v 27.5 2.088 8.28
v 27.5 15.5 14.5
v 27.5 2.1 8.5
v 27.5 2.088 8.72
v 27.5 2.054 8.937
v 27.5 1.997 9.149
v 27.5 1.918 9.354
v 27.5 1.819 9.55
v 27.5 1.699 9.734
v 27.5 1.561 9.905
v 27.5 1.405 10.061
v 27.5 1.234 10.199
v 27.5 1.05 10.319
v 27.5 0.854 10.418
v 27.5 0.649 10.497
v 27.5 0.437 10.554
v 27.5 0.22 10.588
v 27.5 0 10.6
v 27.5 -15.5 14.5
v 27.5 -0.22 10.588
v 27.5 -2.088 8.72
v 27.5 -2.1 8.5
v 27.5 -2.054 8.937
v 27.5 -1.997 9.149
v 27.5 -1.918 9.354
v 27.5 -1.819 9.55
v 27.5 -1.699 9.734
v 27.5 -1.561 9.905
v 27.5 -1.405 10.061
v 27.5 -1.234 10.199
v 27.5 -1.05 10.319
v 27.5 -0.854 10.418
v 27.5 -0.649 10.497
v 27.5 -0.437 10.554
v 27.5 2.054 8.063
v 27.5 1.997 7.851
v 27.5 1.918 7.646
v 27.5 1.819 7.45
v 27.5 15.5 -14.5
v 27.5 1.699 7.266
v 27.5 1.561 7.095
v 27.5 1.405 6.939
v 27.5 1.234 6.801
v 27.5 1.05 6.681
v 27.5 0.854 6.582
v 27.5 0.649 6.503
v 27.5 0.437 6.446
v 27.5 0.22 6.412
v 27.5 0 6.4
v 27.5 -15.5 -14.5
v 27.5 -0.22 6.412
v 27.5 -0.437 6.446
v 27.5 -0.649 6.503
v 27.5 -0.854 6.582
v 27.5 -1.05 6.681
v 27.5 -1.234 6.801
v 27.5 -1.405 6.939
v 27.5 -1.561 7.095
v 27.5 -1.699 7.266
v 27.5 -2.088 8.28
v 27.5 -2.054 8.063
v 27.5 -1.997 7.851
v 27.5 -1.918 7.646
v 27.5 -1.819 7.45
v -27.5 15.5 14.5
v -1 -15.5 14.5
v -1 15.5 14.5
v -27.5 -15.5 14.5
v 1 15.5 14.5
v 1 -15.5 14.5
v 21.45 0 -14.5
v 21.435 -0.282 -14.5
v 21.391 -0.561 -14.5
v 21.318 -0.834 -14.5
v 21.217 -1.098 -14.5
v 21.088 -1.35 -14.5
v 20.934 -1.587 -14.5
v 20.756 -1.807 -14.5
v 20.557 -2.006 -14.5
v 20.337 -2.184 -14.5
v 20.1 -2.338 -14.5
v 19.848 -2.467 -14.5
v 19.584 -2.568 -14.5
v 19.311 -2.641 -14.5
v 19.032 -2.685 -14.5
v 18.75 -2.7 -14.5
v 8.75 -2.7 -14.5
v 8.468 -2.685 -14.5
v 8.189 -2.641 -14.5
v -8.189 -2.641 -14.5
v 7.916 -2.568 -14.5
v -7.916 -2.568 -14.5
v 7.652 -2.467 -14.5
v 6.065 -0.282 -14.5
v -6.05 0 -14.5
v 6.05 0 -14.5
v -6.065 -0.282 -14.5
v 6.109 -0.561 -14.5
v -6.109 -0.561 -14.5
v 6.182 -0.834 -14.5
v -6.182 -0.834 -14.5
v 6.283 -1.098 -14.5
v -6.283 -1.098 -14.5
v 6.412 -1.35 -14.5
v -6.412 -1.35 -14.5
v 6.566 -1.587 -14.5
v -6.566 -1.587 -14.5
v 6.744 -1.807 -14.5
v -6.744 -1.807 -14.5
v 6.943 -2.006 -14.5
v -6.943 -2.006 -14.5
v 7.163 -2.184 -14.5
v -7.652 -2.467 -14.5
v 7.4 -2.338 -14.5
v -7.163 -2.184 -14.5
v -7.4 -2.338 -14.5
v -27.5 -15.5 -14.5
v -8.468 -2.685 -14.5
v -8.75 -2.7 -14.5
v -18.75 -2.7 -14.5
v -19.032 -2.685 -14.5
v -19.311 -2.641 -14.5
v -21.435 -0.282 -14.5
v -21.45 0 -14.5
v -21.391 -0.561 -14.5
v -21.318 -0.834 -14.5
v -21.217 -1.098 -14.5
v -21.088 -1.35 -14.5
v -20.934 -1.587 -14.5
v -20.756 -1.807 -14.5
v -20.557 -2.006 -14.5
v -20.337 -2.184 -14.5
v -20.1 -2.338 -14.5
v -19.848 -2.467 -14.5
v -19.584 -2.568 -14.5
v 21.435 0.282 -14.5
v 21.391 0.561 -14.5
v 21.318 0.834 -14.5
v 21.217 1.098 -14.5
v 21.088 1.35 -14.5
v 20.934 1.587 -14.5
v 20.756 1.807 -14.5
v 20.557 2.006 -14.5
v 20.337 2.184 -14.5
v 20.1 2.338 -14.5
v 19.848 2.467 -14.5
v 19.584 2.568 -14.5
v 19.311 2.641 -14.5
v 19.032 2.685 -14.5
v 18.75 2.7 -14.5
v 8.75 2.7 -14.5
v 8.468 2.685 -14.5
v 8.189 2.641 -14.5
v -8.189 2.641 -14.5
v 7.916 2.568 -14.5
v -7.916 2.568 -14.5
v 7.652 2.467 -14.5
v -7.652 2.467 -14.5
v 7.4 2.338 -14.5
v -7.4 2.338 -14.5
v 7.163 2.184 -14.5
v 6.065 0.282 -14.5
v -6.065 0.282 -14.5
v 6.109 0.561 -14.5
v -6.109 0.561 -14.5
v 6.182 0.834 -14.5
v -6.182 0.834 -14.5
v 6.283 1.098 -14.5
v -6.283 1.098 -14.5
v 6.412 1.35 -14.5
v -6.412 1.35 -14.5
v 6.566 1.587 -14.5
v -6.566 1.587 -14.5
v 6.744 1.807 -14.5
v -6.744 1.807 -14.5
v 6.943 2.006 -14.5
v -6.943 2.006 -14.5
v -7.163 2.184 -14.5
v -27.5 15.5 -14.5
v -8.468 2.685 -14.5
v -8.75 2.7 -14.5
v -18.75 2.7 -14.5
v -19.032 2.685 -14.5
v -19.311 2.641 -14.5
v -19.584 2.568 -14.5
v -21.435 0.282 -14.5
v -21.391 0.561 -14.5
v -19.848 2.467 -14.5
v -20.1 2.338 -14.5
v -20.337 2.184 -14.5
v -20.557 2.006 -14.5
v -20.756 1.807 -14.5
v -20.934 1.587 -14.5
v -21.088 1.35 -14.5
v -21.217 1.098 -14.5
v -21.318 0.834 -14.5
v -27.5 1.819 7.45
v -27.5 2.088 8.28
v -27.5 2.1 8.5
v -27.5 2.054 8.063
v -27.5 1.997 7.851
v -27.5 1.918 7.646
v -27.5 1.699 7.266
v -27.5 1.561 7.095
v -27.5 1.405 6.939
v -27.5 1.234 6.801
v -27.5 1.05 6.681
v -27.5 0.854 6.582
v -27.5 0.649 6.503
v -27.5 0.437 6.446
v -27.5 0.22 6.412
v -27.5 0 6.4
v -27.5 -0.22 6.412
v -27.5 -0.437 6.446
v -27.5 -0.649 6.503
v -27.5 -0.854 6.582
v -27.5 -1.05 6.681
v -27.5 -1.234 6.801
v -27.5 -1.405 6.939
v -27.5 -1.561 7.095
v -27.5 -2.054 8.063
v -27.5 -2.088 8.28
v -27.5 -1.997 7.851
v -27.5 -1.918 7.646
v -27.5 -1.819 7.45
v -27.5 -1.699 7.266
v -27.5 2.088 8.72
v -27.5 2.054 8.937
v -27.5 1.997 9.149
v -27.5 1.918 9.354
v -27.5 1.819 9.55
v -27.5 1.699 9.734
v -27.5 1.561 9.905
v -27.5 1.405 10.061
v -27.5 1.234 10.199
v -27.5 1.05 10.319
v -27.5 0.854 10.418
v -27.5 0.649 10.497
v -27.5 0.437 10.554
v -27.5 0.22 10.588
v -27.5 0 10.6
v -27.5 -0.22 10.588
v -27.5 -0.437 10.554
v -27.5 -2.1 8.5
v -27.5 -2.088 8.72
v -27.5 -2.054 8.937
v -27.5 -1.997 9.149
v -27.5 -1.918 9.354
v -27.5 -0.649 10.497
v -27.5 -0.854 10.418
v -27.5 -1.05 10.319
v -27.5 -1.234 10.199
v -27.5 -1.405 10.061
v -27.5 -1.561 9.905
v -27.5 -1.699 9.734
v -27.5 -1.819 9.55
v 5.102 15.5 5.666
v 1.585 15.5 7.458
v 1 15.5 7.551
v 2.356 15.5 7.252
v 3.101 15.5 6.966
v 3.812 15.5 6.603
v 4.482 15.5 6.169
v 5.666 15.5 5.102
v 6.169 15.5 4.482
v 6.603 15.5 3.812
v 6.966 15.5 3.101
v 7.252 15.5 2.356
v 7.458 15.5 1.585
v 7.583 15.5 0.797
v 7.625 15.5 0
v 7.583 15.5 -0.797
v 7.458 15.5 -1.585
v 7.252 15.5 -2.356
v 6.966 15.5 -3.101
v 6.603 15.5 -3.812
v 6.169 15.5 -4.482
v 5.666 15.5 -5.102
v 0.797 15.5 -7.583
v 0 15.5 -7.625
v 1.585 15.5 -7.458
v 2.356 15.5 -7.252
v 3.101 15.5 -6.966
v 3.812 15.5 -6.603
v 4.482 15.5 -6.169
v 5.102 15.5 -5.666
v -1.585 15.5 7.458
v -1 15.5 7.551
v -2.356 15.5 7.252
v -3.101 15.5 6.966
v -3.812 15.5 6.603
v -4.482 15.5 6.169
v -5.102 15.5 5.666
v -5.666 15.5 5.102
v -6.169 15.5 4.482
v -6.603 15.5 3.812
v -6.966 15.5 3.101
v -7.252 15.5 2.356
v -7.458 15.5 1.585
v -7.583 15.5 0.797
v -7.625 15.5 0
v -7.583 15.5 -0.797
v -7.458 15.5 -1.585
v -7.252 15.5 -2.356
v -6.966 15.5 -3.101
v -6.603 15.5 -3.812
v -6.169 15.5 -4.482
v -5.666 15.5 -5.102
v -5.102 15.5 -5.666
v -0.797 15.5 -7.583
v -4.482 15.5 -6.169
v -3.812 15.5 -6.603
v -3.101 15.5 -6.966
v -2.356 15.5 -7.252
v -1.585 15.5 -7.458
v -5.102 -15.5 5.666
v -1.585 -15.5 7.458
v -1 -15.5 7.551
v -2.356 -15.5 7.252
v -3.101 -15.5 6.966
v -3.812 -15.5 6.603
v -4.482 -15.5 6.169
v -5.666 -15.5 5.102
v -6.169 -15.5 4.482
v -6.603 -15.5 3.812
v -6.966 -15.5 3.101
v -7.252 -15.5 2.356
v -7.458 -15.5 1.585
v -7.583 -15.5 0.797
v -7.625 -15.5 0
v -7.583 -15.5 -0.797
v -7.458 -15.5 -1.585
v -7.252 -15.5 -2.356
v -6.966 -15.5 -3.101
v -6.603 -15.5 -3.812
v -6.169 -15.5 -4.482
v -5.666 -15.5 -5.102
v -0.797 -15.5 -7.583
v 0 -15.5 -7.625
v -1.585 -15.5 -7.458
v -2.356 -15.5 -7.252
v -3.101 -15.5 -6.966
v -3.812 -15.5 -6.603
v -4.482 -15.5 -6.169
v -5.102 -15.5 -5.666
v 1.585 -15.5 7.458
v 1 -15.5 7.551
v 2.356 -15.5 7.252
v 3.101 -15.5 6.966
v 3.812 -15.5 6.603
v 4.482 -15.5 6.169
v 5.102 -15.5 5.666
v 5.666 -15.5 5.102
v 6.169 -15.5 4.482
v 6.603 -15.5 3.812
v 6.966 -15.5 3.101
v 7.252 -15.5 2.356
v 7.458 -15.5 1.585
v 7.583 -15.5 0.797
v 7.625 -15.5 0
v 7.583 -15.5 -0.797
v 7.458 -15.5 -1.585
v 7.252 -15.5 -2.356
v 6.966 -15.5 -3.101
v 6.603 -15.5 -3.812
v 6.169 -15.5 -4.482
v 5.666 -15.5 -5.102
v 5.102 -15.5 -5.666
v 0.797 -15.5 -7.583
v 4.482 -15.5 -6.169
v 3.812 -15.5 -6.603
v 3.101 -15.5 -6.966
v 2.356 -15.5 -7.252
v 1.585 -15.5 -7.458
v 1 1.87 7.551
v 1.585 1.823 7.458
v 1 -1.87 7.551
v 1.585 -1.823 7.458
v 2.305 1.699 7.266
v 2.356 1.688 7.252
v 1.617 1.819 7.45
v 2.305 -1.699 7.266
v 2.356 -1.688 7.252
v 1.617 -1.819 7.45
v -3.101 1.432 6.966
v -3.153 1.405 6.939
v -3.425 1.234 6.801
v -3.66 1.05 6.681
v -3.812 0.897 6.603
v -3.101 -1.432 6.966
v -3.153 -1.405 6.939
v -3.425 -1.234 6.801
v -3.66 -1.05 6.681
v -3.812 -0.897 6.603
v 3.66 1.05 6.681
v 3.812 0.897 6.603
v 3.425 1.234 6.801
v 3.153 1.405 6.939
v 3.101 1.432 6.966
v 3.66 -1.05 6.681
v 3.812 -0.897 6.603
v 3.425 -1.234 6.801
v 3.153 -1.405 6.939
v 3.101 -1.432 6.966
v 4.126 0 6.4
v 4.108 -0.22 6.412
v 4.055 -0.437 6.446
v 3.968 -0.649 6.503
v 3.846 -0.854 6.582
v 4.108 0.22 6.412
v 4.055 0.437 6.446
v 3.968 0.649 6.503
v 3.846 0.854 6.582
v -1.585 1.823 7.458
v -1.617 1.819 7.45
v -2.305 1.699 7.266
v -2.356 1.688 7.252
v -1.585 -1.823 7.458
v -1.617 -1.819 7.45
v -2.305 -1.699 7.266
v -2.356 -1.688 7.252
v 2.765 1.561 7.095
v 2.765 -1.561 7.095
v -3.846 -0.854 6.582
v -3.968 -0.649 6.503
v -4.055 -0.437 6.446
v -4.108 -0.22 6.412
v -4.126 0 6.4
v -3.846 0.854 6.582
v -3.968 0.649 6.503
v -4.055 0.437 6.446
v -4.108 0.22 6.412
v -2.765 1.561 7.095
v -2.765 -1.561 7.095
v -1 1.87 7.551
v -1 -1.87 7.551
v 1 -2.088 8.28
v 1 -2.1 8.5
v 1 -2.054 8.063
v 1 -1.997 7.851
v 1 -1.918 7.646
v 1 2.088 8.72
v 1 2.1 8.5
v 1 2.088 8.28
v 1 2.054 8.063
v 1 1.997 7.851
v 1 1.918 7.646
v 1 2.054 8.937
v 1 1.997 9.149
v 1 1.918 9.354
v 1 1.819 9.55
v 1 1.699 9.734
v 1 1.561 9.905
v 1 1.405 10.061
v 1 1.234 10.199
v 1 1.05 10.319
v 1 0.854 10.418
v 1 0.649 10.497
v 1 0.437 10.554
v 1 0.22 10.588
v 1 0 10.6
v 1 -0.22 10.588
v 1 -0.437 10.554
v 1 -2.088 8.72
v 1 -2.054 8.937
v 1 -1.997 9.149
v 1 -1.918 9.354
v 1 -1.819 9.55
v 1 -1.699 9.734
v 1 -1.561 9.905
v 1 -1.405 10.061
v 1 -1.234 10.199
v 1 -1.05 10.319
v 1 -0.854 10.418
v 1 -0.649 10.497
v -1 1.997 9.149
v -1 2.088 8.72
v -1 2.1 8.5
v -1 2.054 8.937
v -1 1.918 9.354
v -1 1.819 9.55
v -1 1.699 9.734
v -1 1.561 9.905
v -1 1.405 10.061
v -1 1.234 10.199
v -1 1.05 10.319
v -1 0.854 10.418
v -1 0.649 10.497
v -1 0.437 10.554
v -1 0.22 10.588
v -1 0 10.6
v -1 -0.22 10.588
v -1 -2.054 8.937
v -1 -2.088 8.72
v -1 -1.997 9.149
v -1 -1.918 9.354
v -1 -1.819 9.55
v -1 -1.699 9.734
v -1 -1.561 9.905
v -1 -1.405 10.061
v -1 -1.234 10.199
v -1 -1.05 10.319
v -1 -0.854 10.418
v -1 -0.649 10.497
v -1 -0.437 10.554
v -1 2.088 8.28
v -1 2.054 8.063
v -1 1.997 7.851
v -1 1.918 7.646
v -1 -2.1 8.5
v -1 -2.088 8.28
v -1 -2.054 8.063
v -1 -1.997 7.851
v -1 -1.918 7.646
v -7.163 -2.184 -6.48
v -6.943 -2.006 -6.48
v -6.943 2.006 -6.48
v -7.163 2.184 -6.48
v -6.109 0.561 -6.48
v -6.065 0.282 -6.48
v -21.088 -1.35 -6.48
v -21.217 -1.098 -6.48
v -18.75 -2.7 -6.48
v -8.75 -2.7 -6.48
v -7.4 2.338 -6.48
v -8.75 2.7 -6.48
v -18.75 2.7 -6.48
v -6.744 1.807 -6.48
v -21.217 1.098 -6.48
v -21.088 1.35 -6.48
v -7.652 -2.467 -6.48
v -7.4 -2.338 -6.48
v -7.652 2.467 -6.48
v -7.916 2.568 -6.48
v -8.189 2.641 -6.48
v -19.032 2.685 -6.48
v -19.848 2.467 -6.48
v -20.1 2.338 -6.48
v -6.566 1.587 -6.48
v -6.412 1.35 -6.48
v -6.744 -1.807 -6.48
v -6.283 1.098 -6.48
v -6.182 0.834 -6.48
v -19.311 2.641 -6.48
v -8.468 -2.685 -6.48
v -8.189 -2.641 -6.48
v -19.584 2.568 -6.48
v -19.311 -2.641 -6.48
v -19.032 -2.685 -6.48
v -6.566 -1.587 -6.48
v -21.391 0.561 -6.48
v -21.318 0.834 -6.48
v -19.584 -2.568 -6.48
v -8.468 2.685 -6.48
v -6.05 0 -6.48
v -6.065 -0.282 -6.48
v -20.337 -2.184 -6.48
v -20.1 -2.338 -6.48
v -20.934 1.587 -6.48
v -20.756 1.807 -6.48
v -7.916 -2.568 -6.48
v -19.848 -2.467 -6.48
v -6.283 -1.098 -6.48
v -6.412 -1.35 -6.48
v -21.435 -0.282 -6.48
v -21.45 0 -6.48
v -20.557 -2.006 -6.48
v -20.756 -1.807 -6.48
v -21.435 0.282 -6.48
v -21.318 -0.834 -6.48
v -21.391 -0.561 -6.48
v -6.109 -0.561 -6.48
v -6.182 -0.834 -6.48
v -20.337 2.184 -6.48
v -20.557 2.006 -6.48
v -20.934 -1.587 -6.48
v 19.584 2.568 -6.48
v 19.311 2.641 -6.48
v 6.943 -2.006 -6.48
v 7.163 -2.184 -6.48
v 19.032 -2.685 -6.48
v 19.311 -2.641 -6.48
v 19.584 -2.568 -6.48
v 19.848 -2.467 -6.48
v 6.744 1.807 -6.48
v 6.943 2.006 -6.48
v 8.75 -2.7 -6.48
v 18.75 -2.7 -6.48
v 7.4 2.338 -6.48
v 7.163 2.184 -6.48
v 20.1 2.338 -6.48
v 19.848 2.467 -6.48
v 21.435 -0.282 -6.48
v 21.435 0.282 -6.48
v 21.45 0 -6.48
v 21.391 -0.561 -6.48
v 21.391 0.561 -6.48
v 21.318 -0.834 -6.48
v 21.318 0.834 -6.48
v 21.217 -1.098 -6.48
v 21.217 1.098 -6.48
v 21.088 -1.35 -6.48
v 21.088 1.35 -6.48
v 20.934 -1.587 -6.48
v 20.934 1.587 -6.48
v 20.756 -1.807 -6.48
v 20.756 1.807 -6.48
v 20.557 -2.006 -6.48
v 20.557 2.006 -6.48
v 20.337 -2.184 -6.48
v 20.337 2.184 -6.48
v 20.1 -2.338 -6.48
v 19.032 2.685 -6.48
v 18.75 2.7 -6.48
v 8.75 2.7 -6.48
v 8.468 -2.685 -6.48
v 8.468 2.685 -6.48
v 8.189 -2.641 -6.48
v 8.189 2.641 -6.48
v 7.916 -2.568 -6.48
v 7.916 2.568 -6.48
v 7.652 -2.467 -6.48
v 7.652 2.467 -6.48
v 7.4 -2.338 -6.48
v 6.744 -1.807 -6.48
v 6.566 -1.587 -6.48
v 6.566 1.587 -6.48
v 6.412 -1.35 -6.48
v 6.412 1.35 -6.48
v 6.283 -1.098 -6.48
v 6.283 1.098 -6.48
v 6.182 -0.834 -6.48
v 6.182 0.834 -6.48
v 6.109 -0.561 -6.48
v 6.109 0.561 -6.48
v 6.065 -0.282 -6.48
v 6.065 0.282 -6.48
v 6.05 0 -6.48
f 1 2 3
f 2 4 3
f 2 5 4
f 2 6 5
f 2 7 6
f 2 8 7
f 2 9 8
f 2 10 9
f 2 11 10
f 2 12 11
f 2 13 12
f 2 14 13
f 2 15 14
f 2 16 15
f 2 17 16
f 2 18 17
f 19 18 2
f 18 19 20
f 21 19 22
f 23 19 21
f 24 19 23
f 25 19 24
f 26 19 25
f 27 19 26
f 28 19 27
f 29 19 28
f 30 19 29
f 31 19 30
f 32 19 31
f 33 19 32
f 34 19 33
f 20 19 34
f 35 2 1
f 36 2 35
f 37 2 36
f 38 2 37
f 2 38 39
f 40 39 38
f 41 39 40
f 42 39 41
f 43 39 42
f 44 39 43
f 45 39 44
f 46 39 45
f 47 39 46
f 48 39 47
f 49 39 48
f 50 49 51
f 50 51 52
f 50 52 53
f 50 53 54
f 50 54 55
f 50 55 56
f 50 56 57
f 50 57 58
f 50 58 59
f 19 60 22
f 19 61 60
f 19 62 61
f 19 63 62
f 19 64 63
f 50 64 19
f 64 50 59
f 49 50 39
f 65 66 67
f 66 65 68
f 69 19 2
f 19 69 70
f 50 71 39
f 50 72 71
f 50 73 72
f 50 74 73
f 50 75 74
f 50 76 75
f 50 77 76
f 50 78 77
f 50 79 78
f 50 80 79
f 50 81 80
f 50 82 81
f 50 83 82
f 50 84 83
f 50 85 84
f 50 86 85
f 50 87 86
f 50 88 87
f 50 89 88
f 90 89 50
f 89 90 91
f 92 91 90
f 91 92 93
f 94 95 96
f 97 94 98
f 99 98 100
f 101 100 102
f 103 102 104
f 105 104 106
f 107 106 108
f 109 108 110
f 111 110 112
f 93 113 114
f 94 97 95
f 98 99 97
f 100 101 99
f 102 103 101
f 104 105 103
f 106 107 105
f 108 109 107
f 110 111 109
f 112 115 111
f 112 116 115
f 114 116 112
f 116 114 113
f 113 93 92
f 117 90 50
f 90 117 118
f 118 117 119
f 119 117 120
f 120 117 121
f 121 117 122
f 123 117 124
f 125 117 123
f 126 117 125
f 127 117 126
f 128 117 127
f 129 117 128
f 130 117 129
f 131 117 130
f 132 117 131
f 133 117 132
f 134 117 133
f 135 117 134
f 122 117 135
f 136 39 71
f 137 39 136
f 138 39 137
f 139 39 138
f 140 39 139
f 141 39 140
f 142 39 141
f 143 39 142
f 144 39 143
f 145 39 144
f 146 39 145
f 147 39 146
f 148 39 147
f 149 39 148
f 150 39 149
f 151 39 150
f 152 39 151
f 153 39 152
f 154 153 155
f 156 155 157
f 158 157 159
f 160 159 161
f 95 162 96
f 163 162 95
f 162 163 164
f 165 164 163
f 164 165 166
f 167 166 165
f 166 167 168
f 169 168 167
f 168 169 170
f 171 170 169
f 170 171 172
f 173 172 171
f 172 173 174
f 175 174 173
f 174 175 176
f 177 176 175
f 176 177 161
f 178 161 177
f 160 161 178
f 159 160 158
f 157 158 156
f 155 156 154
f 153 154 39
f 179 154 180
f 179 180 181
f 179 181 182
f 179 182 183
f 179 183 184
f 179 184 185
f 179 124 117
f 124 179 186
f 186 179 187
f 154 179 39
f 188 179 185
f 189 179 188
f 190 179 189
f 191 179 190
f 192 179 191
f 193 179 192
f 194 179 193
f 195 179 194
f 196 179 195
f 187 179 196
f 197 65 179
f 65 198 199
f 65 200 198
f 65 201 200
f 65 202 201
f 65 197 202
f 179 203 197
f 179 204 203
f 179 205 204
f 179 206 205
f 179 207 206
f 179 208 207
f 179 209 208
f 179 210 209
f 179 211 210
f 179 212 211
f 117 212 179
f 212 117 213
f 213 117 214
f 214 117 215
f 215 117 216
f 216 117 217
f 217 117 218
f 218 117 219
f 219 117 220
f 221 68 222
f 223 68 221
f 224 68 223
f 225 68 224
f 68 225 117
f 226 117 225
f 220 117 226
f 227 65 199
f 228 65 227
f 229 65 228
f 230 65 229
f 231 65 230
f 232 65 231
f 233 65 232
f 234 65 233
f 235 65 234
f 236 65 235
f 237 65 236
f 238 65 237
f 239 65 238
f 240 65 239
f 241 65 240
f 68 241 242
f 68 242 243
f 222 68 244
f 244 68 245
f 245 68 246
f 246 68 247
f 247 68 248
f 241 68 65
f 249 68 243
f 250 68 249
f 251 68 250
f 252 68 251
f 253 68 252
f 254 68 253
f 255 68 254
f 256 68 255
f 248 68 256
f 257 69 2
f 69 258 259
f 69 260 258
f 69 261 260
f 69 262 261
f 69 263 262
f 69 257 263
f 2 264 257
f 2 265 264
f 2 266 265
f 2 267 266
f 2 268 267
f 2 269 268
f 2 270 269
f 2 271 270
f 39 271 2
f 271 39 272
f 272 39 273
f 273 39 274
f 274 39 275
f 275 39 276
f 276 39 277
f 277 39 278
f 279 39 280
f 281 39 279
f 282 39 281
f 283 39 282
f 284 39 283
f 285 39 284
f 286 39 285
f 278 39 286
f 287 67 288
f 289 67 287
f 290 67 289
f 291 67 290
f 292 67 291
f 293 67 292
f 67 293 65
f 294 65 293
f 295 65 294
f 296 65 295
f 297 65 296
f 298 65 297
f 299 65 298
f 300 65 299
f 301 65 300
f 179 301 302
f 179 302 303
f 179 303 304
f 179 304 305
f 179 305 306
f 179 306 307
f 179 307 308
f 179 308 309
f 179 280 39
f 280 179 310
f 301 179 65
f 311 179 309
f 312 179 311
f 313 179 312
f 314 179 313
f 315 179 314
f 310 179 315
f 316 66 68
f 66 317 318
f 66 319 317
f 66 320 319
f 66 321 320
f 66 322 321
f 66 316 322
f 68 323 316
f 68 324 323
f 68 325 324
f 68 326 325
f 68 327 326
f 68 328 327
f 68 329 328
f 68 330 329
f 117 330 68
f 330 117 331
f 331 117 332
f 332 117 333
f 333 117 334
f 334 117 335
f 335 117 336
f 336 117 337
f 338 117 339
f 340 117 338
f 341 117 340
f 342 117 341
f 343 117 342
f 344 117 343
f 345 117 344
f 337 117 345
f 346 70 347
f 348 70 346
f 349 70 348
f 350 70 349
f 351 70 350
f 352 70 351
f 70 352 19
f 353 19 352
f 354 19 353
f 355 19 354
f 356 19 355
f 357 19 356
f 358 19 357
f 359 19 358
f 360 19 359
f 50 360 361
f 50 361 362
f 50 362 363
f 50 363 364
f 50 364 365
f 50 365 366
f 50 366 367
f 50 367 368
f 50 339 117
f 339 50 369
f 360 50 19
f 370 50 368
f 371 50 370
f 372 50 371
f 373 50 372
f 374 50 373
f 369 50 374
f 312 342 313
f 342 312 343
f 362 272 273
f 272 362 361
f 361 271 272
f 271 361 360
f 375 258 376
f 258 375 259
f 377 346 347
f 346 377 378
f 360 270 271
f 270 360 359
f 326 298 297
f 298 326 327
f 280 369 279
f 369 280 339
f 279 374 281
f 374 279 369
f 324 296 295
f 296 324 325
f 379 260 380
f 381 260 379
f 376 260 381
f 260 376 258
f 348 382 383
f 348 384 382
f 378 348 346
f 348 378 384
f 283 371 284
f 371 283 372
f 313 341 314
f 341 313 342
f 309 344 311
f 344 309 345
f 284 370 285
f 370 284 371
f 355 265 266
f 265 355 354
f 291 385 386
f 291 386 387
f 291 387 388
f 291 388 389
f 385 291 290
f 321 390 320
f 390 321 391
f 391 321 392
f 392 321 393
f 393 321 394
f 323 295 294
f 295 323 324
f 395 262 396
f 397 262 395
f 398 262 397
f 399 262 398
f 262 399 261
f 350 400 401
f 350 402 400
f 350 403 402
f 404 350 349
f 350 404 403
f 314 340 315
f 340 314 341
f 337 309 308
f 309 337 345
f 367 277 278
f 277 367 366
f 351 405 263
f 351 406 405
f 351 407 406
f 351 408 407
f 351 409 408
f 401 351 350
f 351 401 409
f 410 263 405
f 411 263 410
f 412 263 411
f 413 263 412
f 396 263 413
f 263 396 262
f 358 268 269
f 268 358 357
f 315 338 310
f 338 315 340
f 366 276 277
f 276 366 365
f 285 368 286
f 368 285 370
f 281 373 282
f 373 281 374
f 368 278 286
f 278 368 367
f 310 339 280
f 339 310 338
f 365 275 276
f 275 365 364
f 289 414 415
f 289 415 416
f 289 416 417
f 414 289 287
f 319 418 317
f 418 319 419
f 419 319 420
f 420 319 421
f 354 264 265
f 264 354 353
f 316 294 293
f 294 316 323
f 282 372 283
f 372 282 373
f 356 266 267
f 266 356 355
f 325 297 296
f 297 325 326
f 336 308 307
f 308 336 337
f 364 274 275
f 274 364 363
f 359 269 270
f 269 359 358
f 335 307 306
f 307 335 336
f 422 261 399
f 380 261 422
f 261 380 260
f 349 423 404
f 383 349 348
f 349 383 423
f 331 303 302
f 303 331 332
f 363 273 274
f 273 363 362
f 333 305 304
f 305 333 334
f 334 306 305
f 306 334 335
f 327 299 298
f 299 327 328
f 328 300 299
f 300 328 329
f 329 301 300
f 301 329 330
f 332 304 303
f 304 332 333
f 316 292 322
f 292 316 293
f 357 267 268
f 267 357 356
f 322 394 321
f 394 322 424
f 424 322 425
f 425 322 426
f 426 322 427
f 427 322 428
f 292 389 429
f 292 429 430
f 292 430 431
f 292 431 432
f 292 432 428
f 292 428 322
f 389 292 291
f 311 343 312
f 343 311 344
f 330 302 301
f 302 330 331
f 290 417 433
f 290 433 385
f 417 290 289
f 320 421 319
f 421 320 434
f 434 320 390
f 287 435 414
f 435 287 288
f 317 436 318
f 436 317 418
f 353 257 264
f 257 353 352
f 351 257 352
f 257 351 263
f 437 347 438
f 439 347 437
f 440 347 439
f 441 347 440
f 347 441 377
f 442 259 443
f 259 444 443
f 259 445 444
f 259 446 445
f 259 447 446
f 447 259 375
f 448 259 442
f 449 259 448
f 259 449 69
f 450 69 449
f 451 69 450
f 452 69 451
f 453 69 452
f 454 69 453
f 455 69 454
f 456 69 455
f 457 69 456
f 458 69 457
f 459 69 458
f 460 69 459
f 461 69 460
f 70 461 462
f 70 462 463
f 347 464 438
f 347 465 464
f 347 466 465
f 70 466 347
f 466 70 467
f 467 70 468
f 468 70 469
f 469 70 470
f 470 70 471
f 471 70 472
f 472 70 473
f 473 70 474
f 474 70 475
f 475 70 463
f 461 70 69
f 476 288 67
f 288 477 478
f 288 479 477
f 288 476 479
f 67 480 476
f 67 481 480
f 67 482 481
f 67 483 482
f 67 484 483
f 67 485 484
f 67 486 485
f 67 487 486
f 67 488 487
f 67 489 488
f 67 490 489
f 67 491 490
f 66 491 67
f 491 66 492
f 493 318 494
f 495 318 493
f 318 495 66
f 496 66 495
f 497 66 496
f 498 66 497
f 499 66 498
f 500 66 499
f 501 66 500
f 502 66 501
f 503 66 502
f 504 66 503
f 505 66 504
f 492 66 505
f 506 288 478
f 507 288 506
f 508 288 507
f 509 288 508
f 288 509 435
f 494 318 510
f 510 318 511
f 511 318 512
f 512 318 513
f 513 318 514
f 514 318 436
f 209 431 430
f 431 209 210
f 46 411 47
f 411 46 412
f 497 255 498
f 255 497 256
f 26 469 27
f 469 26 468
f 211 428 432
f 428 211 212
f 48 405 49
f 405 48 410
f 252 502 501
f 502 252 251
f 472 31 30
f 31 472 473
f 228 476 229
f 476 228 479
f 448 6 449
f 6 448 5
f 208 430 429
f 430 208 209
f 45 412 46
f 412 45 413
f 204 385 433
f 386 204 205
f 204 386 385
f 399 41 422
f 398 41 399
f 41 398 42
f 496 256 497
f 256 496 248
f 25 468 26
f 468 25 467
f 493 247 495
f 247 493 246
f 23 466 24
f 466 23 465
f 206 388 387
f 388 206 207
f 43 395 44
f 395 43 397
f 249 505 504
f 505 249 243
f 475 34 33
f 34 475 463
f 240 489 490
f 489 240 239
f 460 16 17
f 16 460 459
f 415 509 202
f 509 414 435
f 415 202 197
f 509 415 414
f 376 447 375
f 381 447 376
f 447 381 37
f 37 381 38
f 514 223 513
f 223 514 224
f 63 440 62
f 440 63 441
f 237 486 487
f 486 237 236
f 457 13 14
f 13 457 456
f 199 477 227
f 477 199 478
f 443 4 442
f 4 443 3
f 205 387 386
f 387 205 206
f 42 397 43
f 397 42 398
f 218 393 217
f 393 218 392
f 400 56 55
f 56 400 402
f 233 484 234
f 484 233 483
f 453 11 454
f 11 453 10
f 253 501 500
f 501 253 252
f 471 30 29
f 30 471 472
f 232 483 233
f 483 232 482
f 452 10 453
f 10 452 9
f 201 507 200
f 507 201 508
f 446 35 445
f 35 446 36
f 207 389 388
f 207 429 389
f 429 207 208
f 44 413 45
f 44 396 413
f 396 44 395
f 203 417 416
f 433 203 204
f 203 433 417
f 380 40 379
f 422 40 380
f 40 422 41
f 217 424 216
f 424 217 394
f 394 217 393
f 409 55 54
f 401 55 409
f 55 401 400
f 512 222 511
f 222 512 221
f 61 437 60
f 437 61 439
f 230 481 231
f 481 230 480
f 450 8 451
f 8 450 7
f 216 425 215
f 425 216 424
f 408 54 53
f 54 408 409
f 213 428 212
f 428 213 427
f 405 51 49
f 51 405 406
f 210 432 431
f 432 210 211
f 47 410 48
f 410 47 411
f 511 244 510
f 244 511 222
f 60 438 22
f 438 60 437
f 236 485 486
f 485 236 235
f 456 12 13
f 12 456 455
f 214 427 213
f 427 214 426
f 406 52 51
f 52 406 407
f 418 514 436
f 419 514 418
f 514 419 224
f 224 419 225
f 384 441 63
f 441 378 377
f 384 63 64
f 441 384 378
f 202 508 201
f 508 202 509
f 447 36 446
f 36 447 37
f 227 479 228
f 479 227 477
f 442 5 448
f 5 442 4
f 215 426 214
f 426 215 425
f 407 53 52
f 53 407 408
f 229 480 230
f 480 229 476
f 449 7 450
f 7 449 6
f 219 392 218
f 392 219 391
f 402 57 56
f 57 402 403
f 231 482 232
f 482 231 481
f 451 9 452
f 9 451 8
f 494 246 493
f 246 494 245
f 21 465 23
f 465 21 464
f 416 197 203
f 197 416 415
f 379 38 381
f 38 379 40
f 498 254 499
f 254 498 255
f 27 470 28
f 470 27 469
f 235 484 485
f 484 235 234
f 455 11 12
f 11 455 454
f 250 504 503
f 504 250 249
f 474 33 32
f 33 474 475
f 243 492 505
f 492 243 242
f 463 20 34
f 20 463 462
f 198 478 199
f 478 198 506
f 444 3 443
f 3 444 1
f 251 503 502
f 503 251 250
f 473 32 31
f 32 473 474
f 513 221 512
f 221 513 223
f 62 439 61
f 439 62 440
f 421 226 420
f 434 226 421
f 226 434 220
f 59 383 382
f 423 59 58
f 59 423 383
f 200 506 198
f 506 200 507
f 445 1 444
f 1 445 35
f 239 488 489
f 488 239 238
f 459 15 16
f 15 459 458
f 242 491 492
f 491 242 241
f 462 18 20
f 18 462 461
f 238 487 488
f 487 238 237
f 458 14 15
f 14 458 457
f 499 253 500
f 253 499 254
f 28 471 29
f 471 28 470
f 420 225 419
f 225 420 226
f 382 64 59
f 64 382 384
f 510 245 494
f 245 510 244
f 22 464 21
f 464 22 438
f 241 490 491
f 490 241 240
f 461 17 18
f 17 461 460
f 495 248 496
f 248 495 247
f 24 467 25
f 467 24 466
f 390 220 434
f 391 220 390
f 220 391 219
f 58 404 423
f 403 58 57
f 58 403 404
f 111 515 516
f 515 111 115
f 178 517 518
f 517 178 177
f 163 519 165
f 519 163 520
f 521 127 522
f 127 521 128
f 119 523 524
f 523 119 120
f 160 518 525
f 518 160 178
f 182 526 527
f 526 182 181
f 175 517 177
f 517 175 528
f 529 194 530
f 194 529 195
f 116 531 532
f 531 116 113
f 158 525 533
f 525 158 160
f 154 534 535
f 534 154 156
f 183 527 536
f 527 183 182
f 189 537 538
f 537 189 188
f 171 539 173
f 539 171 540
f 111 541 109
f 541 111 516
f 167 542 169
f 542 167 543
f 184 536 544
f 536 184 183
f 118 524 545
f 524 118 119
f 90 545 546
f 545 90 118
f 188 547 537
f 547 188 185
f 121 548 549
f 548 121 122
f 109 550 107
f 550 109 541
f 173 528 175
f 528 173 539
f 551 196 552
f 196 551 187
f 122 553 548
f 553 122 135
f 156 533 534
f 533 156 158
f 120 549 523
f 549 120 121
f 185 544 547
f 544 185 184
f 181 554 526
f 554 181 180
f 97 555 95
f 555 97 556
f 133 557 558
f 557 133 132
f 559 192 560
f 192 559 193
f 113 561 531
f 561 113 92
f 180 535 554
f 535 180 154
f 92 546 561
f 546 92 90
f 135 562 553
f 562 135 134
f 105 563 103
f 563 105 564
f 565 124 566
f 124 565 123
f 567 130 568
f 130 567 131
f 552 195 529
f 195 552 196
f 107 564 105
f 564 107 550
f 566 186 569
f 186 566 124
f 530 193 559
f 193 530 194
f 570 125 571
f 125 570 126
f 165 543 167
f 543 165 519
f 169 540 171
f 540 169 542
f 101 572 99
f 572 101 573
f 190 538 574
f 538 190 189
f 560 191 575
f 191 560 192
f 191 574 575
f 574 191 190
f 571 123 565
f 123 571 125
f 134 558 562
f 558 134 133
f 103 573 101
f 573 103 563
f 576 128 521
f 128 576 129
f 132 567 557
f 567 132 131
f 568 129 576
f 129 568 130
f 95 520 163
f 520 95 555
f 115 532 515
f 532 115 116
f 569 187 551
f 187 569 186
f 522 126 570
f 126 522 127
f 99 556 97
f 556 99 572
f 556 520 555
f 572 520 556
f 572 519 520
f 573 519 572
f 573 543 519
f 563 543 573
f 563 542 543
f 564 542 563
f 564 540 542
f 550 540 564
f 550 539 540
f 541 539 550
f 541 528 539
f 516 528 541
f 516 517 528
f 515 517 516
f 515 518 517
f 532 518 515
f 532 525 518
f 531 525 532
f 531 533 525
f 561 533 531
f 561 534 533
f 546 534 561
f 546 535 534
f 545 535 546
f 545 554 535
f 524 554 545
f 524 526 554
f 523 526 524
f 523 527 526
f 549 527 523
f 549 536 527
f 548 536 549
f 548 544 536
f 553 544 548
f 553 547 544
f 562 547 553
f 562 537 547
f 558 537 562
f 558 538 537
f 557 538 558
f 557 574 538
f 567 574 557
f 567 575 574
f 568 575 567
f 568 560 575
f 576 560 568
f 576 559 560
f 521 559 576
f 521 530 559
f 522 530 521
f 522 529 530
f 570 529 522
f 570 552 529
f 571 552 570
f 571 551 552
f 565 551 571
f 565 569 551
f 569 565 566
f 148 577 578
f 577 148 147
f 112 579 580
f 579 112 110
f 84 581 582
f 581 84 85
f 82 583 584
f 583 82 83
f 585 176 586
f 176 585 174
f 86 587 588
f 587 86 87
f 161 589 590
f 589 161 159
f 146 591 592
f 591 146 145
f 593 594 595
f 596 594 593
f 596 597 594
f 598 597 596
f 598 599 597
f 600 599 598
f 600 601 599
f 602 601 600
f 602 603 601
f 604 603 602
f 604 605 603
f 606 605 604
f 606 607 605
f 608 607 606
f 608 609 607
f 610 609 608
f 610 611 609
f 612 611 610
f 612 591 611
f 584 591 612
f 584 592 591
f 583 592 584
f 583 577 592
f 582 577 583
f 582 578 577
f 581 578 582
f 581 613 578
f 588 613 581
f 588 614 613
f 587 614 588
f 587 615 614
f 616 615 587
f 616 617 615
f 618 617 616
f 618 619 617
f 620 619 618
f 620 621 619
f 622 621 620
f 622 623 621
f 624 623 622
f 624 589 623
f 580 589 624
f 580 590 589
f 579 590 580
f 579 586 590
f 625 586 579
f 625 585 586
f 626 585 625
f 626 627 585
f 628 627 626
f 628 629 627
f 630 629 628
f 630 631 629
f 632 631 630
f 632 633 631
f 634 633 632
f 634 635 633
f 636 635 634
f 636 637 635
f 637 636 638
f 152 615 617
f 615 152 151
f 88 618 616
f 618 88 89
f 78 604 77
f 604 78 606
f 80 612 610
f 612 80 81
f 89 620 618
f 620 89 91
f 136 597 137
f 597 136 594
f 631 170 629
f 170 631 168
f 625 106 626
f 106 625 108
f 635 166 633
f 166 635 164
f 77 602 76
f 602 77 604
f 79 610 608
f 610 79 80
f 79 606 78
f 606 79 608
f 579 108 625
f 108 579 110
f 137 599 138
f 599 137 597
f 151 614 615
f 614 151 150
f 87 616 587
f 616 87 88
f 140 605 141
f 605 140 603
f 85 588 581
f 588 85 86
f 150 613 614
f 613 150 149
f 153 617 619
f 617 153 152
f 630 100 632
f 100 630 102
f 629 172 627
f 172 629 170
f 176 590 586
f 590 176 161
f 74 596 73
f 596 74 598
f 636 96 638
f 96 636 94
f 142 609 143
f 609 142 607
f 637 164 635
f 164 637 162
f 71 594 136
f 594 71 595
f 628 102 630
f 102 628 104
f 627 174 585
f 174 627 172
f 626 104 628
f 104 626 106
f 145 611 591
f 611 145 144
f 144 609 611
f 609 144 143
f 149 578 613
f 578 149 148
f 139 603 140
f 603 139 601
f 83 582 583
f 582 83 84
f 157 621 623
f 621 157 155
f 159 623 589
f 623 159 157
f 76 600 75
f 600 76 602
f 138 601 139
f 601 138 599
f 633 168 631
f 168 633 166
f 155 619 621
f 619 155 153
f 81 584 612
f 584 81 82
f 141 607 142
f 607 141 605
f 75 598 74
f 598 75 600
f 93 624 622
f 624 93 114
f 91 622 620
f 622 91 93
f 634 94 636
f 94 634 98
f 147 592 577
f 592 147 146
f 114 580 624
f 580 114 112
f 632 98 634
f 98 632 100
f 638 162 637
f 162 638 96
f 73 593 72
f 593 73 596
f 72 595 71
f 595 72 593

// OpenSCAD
// Split housing for 15 mm OD linear bearing.
$fn = 60;
eps = 0.02;
bearing_d = 15;
body_l = 55;
body_d = 31;
body_h = 29;
slot_w = 2;
module mount_slot(x) {
    hull() {
        translate([x - 5, 0, -body_h / 2 - eps]) cylinder(d = 5.4, h = 8 + 2 * eps);
        translate([x + 5, 0, -body_h / 2 - eps]) cylinder(d = 5.4, h = 8 + 2 * eps);
    }
}
difference() {
    cube([body_l, body_d, body_h], center = true);
    translate([0, -body_d / 2 - eps, 0]) rotate([-90, 0, 0]) cylinder(d = bearing_d + 0.25, h = body_d + 2 * eps);
    translate([-slot_w / 2, -body_d / 2 - eps, 0]) cube([slot_w, body_d + 2 * eps, body_h / 2 + eps]);
    translate([-body_l / 2 - eps, 0, body_h / 2 - 6]) rotate([0, 90, 0]) cylinder(d = 4.2, h = body_l + 2 * eps);
    mount_slot(-body_l / 4);
    mount_slot(body_l / 4);
}
